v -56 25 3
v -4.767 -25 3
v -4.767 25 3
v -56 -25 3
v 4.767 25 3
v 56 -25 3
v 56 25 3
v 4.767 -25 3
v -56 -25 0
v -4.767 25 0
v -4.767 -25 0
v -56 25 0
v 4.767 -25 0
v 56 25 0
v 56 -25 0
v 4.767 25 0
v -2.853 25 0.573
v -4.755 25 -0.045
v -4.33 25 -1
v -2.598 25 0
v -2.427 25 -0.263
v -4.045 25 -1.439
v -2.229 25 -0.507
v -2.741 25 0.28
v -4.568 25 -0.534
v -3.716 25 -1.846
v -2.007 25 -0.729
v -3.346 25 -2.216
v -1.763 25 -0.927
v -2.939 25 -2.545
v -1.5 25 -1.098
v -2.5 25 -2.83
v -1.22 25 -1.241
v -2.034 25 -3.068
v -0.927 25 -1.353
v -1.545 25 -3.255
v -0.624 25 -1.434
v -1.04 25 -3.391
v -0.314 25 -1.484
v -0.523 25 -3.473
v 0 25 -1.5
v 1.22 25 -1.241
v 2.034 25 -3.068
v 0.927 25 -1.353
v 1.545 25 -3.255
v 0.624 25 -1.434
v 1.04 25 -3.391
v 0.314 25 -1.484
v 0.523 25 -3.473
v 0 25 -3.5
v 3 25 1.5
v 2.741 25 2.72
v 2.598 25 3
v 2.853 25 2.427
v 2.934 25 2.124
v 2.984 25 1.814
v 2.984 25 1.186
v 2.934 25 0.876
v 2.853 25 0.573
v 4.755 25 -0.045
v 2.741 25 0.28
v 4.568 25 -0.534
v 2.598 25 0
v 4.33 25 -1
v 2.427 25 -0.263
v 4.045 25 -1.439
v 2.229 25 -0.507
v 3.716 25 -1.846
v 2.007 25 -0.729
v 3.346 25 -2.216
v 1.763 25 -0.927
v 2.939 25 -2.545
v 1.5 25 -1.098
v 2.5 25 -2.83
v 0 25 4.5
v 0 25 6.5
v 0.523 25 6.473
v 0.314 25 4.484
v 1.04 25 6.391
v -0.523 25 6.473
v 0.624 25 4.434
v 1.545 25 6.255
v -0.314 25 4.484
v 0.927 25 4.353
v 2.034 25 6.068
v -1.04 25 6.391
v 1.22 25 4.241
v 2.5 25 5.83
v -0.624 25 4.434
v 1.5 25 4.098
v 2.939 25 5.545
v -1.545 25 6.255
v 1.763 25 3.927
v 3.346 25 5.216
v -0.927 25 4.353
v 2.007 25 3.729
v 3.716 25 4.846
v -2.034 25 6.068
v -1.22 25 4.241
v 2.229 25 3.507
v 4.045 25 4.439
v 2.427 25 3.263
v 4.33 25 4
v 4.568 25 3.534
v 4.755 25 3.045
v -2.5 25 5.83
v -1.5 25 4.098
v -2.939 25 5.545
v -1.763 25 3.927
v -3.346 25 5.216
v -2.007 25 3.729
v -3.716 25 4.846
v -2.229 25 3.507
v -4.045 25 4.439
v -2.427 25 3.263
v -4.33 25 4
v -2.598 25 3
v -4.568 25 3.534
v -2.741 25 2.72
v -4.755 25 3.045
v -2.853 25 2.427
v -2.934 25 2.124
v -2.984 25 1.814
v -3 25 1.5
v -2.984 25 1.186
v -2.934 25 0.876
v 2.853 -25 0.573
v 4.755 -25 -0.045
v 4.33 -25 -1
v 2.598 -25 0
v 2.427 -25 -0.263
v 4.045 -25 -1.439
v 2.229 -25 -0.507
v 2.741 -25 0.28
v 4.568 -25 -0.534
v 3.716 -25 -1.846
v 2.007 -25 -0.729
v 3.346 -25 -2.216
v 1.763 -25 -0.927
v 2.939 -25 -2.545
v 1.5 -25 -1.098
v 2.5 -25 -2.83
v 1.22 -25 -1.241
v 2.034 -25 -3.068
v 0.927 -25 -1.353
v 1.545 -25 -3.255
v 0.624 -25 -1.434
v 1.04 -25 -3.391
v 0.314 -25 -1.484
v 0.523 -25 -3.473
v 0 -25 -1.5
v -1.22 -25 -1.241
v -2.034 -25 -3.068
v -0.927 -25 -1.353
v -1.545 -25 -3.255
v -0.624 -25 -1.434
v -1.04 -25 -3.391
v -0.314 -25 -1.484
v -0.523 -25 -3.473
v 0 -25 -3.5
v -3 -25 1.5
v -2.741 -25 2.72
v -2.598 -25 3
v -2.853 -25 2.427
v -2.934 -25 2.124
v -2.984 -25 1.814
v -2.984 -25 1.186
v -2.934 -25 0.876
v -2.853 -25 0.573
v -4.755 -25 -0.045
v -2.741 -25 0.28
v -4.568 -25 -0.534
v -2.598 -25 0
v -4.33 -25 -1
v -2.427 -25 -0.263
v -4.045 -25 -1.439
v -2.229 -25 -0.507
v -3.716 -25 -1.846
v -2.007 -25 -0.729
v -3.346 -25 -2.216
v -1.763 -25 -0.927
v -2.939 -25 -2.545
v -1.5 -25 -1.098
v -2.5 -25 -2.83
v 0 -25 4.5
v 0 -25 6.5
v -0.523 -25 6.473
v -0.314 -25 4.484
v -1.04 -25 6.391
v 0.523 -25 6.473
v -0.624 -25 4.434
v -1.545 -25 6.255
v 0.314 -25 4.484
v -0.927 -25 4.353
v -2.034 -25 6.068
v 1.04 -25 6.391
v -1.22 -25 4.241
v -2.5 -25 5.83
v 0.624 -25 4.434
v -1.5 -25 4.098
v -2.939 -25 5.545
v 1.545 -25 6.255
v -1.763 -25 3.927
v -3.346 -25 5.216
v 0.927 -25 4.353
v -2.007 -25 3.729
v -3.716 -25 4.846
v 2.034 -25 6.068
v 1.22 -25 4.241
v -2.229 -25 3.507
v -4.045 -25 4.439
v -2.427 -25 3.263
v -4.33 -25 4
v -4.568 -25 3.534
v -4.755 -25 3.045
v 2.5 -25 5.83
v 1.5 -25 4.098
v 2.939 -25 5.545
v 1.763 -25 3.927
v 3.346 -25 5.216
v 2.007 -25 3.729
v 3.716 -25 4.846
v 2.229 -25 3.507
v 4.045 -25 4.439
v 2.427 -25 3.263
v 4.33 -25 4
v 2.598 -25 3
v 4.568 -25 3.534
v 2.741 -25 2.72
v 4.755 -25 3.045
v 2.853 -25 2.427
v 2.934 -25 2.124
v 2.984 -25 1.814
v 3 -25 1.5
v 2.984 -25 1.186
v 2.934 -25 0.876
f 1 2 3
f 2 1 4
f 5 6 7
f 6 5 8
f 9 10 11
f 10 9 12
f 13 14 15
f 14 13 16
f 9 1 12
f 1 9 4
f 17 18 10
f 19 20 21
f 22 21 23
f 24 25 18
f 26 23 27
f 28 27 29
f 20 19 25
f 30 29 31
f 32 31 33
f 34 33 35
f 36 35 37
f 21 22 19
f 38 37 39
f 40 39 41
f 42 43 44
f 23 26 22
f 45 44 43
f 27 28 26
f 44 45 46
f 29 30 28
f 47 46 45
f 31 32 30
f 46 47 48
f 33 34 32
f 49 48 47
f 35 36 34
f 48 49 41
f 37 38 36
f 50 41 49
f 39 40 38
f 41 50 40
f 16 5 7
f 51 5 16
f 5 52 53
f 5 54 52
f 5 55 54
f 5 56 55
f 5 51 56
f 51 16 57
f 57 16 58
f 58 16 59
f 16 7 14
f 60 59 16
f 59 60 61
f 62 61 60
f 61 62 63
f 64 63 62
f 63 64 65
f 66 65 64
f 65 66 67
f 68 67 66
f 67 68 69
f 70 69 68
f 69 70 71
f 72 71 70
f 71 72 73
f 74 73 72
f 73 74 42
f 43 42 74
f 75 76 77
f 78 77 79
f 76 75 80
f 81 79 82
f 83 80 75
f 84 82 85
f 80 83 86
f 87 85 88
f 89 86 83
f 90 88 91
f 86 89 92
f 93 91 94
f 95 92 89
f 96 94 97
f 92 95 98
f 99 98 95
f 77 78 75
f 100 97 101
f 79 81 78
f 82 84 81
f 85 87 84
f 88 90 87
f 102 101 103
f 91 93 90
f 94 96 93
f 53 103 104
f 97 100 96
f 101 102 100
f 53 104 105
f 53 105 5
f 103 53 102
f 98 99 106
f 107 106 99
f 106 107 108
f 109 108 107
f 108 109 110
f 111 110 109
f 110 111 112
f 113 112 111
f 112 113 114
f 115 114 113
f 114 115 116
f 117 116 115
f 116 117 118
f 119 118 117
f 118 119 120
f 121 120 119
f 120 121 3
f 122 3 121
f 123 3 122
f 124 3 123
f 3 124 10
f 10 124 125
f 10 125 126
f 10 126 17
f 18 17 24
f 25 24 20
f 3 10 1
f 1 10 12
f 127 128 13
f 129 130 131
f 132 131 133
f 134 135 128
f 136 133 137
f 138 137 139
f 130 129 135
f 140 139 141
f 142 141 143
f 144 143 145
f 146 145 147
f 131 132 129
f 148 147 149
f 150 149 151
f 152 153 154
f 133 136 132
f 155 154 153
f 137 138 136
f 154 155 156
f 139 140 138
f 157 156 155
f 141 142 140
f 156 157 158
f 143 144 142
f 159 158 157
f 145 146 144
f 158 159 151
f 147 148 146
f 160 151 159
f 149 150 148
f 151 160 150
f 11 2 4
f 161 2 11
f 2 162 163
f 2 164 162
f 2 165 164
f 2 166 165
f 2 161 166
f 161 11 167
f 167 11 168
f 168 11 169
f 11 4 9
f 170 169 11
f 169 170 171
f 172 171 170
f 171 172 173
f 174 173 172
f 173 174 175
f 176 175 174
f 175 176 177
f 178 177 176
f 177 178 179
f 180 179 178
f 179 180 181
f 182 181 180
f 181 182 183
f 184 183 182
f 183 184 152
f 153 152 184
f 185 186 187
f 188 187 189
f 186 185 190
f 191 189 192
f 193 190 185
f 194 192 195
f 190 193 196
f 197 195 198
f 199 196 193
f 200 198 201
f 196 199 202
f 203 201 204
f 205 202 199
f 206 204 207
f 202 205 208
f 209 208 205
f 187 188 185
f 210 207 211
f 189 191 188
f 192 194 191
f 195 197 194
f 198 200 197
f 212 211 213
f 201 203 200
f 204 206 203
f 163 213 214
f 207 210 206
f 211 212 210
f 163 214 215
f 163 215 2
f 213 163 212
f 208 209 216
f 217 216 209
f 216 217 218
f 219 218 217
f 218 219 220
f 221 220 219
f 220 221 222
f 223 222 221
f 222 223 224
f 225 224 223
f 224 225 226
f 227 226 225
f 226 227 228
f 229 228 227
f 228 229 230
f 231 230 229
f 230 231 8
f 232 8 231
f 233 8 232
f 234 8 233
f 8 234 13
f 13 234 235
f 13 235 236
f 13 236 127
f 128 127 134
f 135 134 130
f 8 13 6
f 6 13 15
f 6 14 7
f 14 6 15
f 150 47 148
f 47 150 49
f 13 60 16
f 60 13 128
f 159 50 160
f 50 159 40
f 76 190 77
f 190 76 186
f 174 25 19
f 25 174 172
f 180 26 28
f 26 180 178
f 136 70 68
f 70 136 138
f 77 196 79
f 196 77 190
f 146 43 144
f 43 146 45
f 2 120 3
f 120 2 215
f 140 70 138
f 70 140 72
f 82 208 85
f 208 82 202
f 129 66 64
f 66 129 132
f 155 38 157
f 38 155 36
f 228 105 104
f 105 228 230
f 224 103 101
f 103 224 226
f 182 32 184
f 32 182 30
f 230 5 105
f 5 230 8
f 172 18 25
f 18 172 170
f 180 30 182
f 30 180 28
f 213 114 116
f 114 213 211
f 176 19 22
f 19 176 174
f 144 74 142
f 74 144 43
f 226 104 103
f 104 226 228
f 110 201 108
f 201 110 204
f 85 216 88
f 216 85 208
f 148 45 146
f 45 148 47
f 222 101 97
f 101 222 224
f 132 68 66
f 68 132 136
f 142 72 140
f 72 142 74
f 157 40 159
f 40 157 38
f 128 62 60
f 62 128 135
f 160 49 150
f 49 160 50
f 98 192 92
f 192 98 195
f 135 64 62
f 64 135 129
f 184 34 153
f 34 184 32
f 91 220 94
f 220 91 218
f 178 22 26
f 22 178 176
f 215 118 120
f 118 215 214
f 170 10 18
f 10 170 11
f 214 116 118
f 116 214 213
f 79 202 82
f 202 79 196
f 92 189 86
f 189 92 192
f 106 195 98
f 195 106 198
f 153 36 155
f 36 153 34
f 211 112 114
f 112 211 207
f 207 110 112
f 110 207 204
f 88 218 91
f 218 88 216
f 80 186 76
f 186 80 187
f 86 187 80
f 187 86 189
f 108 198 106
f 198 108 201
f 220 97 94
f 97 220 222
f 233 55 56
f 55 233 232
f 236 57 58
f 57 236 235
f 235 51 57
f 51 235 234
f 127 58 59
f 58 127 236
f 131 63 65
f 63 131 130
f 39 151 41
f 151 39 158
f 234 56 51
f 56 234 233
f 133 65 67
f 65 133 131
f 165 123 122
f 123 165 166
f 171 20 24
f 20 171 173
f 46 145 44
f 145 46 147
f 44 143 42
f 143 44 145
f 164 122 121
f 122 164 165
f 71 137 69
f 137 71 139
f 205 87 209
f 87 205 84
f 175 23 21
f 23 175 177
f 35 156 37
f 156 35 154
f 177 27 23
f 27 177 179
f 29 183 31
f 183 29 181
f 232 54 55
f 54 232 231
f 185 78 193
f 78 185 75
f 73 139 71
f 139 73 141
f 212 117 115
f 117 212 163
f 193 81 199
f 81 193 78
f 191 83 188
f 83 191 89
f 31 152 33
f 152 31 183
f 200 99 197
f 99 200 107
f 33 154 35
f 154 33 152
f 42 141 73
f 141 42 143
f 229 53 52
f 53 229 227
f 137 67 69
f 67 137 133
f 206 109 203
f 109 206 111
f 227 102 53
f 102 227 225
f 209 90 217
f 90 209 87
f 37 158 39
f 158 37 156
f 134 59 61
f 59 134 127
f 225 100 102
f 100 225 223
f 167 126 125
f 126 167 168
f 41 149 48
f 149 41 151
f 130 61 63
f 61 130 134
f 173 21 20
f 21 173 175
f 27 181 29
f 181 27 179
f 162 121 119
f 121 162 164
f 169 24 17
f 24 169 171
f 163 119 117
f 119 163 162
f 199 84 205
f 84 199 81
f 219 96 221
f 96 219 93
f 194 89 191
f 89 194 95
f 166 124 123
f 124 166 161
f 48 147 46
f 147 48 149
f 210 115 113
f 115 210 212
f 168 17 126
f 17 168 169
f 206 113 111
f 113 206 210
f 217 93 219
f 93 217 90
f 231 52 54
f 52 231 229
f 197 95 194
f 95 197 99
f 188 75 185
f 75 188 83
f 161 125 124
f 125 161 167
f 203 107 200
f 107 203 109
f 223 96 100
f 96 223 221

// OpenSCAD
// Compact plate hinge.
$fn = 60;
eps = 0.02;
leaf_l = 56;
width = 50;
pin_d = 6;
leaf_t = 3;
difference() {
    union() {
        translate([-leaf_l,-width/2,0]) cube([leaf_l,width,leaf_t]);
        translate([0,-width/2,0]) cube([leaf_l,width,leaf_t]);
        translate([0,-width/2,leaf_t/2]) rotate([-90,0,0]) cylinder(d=pin_d+4,h=width);
    }
    translate([0,-width/2-eps,leaf_t/2]) rotate([-90,0,0]) cylinder(d=pin_d,h=width+2*eps);
}
